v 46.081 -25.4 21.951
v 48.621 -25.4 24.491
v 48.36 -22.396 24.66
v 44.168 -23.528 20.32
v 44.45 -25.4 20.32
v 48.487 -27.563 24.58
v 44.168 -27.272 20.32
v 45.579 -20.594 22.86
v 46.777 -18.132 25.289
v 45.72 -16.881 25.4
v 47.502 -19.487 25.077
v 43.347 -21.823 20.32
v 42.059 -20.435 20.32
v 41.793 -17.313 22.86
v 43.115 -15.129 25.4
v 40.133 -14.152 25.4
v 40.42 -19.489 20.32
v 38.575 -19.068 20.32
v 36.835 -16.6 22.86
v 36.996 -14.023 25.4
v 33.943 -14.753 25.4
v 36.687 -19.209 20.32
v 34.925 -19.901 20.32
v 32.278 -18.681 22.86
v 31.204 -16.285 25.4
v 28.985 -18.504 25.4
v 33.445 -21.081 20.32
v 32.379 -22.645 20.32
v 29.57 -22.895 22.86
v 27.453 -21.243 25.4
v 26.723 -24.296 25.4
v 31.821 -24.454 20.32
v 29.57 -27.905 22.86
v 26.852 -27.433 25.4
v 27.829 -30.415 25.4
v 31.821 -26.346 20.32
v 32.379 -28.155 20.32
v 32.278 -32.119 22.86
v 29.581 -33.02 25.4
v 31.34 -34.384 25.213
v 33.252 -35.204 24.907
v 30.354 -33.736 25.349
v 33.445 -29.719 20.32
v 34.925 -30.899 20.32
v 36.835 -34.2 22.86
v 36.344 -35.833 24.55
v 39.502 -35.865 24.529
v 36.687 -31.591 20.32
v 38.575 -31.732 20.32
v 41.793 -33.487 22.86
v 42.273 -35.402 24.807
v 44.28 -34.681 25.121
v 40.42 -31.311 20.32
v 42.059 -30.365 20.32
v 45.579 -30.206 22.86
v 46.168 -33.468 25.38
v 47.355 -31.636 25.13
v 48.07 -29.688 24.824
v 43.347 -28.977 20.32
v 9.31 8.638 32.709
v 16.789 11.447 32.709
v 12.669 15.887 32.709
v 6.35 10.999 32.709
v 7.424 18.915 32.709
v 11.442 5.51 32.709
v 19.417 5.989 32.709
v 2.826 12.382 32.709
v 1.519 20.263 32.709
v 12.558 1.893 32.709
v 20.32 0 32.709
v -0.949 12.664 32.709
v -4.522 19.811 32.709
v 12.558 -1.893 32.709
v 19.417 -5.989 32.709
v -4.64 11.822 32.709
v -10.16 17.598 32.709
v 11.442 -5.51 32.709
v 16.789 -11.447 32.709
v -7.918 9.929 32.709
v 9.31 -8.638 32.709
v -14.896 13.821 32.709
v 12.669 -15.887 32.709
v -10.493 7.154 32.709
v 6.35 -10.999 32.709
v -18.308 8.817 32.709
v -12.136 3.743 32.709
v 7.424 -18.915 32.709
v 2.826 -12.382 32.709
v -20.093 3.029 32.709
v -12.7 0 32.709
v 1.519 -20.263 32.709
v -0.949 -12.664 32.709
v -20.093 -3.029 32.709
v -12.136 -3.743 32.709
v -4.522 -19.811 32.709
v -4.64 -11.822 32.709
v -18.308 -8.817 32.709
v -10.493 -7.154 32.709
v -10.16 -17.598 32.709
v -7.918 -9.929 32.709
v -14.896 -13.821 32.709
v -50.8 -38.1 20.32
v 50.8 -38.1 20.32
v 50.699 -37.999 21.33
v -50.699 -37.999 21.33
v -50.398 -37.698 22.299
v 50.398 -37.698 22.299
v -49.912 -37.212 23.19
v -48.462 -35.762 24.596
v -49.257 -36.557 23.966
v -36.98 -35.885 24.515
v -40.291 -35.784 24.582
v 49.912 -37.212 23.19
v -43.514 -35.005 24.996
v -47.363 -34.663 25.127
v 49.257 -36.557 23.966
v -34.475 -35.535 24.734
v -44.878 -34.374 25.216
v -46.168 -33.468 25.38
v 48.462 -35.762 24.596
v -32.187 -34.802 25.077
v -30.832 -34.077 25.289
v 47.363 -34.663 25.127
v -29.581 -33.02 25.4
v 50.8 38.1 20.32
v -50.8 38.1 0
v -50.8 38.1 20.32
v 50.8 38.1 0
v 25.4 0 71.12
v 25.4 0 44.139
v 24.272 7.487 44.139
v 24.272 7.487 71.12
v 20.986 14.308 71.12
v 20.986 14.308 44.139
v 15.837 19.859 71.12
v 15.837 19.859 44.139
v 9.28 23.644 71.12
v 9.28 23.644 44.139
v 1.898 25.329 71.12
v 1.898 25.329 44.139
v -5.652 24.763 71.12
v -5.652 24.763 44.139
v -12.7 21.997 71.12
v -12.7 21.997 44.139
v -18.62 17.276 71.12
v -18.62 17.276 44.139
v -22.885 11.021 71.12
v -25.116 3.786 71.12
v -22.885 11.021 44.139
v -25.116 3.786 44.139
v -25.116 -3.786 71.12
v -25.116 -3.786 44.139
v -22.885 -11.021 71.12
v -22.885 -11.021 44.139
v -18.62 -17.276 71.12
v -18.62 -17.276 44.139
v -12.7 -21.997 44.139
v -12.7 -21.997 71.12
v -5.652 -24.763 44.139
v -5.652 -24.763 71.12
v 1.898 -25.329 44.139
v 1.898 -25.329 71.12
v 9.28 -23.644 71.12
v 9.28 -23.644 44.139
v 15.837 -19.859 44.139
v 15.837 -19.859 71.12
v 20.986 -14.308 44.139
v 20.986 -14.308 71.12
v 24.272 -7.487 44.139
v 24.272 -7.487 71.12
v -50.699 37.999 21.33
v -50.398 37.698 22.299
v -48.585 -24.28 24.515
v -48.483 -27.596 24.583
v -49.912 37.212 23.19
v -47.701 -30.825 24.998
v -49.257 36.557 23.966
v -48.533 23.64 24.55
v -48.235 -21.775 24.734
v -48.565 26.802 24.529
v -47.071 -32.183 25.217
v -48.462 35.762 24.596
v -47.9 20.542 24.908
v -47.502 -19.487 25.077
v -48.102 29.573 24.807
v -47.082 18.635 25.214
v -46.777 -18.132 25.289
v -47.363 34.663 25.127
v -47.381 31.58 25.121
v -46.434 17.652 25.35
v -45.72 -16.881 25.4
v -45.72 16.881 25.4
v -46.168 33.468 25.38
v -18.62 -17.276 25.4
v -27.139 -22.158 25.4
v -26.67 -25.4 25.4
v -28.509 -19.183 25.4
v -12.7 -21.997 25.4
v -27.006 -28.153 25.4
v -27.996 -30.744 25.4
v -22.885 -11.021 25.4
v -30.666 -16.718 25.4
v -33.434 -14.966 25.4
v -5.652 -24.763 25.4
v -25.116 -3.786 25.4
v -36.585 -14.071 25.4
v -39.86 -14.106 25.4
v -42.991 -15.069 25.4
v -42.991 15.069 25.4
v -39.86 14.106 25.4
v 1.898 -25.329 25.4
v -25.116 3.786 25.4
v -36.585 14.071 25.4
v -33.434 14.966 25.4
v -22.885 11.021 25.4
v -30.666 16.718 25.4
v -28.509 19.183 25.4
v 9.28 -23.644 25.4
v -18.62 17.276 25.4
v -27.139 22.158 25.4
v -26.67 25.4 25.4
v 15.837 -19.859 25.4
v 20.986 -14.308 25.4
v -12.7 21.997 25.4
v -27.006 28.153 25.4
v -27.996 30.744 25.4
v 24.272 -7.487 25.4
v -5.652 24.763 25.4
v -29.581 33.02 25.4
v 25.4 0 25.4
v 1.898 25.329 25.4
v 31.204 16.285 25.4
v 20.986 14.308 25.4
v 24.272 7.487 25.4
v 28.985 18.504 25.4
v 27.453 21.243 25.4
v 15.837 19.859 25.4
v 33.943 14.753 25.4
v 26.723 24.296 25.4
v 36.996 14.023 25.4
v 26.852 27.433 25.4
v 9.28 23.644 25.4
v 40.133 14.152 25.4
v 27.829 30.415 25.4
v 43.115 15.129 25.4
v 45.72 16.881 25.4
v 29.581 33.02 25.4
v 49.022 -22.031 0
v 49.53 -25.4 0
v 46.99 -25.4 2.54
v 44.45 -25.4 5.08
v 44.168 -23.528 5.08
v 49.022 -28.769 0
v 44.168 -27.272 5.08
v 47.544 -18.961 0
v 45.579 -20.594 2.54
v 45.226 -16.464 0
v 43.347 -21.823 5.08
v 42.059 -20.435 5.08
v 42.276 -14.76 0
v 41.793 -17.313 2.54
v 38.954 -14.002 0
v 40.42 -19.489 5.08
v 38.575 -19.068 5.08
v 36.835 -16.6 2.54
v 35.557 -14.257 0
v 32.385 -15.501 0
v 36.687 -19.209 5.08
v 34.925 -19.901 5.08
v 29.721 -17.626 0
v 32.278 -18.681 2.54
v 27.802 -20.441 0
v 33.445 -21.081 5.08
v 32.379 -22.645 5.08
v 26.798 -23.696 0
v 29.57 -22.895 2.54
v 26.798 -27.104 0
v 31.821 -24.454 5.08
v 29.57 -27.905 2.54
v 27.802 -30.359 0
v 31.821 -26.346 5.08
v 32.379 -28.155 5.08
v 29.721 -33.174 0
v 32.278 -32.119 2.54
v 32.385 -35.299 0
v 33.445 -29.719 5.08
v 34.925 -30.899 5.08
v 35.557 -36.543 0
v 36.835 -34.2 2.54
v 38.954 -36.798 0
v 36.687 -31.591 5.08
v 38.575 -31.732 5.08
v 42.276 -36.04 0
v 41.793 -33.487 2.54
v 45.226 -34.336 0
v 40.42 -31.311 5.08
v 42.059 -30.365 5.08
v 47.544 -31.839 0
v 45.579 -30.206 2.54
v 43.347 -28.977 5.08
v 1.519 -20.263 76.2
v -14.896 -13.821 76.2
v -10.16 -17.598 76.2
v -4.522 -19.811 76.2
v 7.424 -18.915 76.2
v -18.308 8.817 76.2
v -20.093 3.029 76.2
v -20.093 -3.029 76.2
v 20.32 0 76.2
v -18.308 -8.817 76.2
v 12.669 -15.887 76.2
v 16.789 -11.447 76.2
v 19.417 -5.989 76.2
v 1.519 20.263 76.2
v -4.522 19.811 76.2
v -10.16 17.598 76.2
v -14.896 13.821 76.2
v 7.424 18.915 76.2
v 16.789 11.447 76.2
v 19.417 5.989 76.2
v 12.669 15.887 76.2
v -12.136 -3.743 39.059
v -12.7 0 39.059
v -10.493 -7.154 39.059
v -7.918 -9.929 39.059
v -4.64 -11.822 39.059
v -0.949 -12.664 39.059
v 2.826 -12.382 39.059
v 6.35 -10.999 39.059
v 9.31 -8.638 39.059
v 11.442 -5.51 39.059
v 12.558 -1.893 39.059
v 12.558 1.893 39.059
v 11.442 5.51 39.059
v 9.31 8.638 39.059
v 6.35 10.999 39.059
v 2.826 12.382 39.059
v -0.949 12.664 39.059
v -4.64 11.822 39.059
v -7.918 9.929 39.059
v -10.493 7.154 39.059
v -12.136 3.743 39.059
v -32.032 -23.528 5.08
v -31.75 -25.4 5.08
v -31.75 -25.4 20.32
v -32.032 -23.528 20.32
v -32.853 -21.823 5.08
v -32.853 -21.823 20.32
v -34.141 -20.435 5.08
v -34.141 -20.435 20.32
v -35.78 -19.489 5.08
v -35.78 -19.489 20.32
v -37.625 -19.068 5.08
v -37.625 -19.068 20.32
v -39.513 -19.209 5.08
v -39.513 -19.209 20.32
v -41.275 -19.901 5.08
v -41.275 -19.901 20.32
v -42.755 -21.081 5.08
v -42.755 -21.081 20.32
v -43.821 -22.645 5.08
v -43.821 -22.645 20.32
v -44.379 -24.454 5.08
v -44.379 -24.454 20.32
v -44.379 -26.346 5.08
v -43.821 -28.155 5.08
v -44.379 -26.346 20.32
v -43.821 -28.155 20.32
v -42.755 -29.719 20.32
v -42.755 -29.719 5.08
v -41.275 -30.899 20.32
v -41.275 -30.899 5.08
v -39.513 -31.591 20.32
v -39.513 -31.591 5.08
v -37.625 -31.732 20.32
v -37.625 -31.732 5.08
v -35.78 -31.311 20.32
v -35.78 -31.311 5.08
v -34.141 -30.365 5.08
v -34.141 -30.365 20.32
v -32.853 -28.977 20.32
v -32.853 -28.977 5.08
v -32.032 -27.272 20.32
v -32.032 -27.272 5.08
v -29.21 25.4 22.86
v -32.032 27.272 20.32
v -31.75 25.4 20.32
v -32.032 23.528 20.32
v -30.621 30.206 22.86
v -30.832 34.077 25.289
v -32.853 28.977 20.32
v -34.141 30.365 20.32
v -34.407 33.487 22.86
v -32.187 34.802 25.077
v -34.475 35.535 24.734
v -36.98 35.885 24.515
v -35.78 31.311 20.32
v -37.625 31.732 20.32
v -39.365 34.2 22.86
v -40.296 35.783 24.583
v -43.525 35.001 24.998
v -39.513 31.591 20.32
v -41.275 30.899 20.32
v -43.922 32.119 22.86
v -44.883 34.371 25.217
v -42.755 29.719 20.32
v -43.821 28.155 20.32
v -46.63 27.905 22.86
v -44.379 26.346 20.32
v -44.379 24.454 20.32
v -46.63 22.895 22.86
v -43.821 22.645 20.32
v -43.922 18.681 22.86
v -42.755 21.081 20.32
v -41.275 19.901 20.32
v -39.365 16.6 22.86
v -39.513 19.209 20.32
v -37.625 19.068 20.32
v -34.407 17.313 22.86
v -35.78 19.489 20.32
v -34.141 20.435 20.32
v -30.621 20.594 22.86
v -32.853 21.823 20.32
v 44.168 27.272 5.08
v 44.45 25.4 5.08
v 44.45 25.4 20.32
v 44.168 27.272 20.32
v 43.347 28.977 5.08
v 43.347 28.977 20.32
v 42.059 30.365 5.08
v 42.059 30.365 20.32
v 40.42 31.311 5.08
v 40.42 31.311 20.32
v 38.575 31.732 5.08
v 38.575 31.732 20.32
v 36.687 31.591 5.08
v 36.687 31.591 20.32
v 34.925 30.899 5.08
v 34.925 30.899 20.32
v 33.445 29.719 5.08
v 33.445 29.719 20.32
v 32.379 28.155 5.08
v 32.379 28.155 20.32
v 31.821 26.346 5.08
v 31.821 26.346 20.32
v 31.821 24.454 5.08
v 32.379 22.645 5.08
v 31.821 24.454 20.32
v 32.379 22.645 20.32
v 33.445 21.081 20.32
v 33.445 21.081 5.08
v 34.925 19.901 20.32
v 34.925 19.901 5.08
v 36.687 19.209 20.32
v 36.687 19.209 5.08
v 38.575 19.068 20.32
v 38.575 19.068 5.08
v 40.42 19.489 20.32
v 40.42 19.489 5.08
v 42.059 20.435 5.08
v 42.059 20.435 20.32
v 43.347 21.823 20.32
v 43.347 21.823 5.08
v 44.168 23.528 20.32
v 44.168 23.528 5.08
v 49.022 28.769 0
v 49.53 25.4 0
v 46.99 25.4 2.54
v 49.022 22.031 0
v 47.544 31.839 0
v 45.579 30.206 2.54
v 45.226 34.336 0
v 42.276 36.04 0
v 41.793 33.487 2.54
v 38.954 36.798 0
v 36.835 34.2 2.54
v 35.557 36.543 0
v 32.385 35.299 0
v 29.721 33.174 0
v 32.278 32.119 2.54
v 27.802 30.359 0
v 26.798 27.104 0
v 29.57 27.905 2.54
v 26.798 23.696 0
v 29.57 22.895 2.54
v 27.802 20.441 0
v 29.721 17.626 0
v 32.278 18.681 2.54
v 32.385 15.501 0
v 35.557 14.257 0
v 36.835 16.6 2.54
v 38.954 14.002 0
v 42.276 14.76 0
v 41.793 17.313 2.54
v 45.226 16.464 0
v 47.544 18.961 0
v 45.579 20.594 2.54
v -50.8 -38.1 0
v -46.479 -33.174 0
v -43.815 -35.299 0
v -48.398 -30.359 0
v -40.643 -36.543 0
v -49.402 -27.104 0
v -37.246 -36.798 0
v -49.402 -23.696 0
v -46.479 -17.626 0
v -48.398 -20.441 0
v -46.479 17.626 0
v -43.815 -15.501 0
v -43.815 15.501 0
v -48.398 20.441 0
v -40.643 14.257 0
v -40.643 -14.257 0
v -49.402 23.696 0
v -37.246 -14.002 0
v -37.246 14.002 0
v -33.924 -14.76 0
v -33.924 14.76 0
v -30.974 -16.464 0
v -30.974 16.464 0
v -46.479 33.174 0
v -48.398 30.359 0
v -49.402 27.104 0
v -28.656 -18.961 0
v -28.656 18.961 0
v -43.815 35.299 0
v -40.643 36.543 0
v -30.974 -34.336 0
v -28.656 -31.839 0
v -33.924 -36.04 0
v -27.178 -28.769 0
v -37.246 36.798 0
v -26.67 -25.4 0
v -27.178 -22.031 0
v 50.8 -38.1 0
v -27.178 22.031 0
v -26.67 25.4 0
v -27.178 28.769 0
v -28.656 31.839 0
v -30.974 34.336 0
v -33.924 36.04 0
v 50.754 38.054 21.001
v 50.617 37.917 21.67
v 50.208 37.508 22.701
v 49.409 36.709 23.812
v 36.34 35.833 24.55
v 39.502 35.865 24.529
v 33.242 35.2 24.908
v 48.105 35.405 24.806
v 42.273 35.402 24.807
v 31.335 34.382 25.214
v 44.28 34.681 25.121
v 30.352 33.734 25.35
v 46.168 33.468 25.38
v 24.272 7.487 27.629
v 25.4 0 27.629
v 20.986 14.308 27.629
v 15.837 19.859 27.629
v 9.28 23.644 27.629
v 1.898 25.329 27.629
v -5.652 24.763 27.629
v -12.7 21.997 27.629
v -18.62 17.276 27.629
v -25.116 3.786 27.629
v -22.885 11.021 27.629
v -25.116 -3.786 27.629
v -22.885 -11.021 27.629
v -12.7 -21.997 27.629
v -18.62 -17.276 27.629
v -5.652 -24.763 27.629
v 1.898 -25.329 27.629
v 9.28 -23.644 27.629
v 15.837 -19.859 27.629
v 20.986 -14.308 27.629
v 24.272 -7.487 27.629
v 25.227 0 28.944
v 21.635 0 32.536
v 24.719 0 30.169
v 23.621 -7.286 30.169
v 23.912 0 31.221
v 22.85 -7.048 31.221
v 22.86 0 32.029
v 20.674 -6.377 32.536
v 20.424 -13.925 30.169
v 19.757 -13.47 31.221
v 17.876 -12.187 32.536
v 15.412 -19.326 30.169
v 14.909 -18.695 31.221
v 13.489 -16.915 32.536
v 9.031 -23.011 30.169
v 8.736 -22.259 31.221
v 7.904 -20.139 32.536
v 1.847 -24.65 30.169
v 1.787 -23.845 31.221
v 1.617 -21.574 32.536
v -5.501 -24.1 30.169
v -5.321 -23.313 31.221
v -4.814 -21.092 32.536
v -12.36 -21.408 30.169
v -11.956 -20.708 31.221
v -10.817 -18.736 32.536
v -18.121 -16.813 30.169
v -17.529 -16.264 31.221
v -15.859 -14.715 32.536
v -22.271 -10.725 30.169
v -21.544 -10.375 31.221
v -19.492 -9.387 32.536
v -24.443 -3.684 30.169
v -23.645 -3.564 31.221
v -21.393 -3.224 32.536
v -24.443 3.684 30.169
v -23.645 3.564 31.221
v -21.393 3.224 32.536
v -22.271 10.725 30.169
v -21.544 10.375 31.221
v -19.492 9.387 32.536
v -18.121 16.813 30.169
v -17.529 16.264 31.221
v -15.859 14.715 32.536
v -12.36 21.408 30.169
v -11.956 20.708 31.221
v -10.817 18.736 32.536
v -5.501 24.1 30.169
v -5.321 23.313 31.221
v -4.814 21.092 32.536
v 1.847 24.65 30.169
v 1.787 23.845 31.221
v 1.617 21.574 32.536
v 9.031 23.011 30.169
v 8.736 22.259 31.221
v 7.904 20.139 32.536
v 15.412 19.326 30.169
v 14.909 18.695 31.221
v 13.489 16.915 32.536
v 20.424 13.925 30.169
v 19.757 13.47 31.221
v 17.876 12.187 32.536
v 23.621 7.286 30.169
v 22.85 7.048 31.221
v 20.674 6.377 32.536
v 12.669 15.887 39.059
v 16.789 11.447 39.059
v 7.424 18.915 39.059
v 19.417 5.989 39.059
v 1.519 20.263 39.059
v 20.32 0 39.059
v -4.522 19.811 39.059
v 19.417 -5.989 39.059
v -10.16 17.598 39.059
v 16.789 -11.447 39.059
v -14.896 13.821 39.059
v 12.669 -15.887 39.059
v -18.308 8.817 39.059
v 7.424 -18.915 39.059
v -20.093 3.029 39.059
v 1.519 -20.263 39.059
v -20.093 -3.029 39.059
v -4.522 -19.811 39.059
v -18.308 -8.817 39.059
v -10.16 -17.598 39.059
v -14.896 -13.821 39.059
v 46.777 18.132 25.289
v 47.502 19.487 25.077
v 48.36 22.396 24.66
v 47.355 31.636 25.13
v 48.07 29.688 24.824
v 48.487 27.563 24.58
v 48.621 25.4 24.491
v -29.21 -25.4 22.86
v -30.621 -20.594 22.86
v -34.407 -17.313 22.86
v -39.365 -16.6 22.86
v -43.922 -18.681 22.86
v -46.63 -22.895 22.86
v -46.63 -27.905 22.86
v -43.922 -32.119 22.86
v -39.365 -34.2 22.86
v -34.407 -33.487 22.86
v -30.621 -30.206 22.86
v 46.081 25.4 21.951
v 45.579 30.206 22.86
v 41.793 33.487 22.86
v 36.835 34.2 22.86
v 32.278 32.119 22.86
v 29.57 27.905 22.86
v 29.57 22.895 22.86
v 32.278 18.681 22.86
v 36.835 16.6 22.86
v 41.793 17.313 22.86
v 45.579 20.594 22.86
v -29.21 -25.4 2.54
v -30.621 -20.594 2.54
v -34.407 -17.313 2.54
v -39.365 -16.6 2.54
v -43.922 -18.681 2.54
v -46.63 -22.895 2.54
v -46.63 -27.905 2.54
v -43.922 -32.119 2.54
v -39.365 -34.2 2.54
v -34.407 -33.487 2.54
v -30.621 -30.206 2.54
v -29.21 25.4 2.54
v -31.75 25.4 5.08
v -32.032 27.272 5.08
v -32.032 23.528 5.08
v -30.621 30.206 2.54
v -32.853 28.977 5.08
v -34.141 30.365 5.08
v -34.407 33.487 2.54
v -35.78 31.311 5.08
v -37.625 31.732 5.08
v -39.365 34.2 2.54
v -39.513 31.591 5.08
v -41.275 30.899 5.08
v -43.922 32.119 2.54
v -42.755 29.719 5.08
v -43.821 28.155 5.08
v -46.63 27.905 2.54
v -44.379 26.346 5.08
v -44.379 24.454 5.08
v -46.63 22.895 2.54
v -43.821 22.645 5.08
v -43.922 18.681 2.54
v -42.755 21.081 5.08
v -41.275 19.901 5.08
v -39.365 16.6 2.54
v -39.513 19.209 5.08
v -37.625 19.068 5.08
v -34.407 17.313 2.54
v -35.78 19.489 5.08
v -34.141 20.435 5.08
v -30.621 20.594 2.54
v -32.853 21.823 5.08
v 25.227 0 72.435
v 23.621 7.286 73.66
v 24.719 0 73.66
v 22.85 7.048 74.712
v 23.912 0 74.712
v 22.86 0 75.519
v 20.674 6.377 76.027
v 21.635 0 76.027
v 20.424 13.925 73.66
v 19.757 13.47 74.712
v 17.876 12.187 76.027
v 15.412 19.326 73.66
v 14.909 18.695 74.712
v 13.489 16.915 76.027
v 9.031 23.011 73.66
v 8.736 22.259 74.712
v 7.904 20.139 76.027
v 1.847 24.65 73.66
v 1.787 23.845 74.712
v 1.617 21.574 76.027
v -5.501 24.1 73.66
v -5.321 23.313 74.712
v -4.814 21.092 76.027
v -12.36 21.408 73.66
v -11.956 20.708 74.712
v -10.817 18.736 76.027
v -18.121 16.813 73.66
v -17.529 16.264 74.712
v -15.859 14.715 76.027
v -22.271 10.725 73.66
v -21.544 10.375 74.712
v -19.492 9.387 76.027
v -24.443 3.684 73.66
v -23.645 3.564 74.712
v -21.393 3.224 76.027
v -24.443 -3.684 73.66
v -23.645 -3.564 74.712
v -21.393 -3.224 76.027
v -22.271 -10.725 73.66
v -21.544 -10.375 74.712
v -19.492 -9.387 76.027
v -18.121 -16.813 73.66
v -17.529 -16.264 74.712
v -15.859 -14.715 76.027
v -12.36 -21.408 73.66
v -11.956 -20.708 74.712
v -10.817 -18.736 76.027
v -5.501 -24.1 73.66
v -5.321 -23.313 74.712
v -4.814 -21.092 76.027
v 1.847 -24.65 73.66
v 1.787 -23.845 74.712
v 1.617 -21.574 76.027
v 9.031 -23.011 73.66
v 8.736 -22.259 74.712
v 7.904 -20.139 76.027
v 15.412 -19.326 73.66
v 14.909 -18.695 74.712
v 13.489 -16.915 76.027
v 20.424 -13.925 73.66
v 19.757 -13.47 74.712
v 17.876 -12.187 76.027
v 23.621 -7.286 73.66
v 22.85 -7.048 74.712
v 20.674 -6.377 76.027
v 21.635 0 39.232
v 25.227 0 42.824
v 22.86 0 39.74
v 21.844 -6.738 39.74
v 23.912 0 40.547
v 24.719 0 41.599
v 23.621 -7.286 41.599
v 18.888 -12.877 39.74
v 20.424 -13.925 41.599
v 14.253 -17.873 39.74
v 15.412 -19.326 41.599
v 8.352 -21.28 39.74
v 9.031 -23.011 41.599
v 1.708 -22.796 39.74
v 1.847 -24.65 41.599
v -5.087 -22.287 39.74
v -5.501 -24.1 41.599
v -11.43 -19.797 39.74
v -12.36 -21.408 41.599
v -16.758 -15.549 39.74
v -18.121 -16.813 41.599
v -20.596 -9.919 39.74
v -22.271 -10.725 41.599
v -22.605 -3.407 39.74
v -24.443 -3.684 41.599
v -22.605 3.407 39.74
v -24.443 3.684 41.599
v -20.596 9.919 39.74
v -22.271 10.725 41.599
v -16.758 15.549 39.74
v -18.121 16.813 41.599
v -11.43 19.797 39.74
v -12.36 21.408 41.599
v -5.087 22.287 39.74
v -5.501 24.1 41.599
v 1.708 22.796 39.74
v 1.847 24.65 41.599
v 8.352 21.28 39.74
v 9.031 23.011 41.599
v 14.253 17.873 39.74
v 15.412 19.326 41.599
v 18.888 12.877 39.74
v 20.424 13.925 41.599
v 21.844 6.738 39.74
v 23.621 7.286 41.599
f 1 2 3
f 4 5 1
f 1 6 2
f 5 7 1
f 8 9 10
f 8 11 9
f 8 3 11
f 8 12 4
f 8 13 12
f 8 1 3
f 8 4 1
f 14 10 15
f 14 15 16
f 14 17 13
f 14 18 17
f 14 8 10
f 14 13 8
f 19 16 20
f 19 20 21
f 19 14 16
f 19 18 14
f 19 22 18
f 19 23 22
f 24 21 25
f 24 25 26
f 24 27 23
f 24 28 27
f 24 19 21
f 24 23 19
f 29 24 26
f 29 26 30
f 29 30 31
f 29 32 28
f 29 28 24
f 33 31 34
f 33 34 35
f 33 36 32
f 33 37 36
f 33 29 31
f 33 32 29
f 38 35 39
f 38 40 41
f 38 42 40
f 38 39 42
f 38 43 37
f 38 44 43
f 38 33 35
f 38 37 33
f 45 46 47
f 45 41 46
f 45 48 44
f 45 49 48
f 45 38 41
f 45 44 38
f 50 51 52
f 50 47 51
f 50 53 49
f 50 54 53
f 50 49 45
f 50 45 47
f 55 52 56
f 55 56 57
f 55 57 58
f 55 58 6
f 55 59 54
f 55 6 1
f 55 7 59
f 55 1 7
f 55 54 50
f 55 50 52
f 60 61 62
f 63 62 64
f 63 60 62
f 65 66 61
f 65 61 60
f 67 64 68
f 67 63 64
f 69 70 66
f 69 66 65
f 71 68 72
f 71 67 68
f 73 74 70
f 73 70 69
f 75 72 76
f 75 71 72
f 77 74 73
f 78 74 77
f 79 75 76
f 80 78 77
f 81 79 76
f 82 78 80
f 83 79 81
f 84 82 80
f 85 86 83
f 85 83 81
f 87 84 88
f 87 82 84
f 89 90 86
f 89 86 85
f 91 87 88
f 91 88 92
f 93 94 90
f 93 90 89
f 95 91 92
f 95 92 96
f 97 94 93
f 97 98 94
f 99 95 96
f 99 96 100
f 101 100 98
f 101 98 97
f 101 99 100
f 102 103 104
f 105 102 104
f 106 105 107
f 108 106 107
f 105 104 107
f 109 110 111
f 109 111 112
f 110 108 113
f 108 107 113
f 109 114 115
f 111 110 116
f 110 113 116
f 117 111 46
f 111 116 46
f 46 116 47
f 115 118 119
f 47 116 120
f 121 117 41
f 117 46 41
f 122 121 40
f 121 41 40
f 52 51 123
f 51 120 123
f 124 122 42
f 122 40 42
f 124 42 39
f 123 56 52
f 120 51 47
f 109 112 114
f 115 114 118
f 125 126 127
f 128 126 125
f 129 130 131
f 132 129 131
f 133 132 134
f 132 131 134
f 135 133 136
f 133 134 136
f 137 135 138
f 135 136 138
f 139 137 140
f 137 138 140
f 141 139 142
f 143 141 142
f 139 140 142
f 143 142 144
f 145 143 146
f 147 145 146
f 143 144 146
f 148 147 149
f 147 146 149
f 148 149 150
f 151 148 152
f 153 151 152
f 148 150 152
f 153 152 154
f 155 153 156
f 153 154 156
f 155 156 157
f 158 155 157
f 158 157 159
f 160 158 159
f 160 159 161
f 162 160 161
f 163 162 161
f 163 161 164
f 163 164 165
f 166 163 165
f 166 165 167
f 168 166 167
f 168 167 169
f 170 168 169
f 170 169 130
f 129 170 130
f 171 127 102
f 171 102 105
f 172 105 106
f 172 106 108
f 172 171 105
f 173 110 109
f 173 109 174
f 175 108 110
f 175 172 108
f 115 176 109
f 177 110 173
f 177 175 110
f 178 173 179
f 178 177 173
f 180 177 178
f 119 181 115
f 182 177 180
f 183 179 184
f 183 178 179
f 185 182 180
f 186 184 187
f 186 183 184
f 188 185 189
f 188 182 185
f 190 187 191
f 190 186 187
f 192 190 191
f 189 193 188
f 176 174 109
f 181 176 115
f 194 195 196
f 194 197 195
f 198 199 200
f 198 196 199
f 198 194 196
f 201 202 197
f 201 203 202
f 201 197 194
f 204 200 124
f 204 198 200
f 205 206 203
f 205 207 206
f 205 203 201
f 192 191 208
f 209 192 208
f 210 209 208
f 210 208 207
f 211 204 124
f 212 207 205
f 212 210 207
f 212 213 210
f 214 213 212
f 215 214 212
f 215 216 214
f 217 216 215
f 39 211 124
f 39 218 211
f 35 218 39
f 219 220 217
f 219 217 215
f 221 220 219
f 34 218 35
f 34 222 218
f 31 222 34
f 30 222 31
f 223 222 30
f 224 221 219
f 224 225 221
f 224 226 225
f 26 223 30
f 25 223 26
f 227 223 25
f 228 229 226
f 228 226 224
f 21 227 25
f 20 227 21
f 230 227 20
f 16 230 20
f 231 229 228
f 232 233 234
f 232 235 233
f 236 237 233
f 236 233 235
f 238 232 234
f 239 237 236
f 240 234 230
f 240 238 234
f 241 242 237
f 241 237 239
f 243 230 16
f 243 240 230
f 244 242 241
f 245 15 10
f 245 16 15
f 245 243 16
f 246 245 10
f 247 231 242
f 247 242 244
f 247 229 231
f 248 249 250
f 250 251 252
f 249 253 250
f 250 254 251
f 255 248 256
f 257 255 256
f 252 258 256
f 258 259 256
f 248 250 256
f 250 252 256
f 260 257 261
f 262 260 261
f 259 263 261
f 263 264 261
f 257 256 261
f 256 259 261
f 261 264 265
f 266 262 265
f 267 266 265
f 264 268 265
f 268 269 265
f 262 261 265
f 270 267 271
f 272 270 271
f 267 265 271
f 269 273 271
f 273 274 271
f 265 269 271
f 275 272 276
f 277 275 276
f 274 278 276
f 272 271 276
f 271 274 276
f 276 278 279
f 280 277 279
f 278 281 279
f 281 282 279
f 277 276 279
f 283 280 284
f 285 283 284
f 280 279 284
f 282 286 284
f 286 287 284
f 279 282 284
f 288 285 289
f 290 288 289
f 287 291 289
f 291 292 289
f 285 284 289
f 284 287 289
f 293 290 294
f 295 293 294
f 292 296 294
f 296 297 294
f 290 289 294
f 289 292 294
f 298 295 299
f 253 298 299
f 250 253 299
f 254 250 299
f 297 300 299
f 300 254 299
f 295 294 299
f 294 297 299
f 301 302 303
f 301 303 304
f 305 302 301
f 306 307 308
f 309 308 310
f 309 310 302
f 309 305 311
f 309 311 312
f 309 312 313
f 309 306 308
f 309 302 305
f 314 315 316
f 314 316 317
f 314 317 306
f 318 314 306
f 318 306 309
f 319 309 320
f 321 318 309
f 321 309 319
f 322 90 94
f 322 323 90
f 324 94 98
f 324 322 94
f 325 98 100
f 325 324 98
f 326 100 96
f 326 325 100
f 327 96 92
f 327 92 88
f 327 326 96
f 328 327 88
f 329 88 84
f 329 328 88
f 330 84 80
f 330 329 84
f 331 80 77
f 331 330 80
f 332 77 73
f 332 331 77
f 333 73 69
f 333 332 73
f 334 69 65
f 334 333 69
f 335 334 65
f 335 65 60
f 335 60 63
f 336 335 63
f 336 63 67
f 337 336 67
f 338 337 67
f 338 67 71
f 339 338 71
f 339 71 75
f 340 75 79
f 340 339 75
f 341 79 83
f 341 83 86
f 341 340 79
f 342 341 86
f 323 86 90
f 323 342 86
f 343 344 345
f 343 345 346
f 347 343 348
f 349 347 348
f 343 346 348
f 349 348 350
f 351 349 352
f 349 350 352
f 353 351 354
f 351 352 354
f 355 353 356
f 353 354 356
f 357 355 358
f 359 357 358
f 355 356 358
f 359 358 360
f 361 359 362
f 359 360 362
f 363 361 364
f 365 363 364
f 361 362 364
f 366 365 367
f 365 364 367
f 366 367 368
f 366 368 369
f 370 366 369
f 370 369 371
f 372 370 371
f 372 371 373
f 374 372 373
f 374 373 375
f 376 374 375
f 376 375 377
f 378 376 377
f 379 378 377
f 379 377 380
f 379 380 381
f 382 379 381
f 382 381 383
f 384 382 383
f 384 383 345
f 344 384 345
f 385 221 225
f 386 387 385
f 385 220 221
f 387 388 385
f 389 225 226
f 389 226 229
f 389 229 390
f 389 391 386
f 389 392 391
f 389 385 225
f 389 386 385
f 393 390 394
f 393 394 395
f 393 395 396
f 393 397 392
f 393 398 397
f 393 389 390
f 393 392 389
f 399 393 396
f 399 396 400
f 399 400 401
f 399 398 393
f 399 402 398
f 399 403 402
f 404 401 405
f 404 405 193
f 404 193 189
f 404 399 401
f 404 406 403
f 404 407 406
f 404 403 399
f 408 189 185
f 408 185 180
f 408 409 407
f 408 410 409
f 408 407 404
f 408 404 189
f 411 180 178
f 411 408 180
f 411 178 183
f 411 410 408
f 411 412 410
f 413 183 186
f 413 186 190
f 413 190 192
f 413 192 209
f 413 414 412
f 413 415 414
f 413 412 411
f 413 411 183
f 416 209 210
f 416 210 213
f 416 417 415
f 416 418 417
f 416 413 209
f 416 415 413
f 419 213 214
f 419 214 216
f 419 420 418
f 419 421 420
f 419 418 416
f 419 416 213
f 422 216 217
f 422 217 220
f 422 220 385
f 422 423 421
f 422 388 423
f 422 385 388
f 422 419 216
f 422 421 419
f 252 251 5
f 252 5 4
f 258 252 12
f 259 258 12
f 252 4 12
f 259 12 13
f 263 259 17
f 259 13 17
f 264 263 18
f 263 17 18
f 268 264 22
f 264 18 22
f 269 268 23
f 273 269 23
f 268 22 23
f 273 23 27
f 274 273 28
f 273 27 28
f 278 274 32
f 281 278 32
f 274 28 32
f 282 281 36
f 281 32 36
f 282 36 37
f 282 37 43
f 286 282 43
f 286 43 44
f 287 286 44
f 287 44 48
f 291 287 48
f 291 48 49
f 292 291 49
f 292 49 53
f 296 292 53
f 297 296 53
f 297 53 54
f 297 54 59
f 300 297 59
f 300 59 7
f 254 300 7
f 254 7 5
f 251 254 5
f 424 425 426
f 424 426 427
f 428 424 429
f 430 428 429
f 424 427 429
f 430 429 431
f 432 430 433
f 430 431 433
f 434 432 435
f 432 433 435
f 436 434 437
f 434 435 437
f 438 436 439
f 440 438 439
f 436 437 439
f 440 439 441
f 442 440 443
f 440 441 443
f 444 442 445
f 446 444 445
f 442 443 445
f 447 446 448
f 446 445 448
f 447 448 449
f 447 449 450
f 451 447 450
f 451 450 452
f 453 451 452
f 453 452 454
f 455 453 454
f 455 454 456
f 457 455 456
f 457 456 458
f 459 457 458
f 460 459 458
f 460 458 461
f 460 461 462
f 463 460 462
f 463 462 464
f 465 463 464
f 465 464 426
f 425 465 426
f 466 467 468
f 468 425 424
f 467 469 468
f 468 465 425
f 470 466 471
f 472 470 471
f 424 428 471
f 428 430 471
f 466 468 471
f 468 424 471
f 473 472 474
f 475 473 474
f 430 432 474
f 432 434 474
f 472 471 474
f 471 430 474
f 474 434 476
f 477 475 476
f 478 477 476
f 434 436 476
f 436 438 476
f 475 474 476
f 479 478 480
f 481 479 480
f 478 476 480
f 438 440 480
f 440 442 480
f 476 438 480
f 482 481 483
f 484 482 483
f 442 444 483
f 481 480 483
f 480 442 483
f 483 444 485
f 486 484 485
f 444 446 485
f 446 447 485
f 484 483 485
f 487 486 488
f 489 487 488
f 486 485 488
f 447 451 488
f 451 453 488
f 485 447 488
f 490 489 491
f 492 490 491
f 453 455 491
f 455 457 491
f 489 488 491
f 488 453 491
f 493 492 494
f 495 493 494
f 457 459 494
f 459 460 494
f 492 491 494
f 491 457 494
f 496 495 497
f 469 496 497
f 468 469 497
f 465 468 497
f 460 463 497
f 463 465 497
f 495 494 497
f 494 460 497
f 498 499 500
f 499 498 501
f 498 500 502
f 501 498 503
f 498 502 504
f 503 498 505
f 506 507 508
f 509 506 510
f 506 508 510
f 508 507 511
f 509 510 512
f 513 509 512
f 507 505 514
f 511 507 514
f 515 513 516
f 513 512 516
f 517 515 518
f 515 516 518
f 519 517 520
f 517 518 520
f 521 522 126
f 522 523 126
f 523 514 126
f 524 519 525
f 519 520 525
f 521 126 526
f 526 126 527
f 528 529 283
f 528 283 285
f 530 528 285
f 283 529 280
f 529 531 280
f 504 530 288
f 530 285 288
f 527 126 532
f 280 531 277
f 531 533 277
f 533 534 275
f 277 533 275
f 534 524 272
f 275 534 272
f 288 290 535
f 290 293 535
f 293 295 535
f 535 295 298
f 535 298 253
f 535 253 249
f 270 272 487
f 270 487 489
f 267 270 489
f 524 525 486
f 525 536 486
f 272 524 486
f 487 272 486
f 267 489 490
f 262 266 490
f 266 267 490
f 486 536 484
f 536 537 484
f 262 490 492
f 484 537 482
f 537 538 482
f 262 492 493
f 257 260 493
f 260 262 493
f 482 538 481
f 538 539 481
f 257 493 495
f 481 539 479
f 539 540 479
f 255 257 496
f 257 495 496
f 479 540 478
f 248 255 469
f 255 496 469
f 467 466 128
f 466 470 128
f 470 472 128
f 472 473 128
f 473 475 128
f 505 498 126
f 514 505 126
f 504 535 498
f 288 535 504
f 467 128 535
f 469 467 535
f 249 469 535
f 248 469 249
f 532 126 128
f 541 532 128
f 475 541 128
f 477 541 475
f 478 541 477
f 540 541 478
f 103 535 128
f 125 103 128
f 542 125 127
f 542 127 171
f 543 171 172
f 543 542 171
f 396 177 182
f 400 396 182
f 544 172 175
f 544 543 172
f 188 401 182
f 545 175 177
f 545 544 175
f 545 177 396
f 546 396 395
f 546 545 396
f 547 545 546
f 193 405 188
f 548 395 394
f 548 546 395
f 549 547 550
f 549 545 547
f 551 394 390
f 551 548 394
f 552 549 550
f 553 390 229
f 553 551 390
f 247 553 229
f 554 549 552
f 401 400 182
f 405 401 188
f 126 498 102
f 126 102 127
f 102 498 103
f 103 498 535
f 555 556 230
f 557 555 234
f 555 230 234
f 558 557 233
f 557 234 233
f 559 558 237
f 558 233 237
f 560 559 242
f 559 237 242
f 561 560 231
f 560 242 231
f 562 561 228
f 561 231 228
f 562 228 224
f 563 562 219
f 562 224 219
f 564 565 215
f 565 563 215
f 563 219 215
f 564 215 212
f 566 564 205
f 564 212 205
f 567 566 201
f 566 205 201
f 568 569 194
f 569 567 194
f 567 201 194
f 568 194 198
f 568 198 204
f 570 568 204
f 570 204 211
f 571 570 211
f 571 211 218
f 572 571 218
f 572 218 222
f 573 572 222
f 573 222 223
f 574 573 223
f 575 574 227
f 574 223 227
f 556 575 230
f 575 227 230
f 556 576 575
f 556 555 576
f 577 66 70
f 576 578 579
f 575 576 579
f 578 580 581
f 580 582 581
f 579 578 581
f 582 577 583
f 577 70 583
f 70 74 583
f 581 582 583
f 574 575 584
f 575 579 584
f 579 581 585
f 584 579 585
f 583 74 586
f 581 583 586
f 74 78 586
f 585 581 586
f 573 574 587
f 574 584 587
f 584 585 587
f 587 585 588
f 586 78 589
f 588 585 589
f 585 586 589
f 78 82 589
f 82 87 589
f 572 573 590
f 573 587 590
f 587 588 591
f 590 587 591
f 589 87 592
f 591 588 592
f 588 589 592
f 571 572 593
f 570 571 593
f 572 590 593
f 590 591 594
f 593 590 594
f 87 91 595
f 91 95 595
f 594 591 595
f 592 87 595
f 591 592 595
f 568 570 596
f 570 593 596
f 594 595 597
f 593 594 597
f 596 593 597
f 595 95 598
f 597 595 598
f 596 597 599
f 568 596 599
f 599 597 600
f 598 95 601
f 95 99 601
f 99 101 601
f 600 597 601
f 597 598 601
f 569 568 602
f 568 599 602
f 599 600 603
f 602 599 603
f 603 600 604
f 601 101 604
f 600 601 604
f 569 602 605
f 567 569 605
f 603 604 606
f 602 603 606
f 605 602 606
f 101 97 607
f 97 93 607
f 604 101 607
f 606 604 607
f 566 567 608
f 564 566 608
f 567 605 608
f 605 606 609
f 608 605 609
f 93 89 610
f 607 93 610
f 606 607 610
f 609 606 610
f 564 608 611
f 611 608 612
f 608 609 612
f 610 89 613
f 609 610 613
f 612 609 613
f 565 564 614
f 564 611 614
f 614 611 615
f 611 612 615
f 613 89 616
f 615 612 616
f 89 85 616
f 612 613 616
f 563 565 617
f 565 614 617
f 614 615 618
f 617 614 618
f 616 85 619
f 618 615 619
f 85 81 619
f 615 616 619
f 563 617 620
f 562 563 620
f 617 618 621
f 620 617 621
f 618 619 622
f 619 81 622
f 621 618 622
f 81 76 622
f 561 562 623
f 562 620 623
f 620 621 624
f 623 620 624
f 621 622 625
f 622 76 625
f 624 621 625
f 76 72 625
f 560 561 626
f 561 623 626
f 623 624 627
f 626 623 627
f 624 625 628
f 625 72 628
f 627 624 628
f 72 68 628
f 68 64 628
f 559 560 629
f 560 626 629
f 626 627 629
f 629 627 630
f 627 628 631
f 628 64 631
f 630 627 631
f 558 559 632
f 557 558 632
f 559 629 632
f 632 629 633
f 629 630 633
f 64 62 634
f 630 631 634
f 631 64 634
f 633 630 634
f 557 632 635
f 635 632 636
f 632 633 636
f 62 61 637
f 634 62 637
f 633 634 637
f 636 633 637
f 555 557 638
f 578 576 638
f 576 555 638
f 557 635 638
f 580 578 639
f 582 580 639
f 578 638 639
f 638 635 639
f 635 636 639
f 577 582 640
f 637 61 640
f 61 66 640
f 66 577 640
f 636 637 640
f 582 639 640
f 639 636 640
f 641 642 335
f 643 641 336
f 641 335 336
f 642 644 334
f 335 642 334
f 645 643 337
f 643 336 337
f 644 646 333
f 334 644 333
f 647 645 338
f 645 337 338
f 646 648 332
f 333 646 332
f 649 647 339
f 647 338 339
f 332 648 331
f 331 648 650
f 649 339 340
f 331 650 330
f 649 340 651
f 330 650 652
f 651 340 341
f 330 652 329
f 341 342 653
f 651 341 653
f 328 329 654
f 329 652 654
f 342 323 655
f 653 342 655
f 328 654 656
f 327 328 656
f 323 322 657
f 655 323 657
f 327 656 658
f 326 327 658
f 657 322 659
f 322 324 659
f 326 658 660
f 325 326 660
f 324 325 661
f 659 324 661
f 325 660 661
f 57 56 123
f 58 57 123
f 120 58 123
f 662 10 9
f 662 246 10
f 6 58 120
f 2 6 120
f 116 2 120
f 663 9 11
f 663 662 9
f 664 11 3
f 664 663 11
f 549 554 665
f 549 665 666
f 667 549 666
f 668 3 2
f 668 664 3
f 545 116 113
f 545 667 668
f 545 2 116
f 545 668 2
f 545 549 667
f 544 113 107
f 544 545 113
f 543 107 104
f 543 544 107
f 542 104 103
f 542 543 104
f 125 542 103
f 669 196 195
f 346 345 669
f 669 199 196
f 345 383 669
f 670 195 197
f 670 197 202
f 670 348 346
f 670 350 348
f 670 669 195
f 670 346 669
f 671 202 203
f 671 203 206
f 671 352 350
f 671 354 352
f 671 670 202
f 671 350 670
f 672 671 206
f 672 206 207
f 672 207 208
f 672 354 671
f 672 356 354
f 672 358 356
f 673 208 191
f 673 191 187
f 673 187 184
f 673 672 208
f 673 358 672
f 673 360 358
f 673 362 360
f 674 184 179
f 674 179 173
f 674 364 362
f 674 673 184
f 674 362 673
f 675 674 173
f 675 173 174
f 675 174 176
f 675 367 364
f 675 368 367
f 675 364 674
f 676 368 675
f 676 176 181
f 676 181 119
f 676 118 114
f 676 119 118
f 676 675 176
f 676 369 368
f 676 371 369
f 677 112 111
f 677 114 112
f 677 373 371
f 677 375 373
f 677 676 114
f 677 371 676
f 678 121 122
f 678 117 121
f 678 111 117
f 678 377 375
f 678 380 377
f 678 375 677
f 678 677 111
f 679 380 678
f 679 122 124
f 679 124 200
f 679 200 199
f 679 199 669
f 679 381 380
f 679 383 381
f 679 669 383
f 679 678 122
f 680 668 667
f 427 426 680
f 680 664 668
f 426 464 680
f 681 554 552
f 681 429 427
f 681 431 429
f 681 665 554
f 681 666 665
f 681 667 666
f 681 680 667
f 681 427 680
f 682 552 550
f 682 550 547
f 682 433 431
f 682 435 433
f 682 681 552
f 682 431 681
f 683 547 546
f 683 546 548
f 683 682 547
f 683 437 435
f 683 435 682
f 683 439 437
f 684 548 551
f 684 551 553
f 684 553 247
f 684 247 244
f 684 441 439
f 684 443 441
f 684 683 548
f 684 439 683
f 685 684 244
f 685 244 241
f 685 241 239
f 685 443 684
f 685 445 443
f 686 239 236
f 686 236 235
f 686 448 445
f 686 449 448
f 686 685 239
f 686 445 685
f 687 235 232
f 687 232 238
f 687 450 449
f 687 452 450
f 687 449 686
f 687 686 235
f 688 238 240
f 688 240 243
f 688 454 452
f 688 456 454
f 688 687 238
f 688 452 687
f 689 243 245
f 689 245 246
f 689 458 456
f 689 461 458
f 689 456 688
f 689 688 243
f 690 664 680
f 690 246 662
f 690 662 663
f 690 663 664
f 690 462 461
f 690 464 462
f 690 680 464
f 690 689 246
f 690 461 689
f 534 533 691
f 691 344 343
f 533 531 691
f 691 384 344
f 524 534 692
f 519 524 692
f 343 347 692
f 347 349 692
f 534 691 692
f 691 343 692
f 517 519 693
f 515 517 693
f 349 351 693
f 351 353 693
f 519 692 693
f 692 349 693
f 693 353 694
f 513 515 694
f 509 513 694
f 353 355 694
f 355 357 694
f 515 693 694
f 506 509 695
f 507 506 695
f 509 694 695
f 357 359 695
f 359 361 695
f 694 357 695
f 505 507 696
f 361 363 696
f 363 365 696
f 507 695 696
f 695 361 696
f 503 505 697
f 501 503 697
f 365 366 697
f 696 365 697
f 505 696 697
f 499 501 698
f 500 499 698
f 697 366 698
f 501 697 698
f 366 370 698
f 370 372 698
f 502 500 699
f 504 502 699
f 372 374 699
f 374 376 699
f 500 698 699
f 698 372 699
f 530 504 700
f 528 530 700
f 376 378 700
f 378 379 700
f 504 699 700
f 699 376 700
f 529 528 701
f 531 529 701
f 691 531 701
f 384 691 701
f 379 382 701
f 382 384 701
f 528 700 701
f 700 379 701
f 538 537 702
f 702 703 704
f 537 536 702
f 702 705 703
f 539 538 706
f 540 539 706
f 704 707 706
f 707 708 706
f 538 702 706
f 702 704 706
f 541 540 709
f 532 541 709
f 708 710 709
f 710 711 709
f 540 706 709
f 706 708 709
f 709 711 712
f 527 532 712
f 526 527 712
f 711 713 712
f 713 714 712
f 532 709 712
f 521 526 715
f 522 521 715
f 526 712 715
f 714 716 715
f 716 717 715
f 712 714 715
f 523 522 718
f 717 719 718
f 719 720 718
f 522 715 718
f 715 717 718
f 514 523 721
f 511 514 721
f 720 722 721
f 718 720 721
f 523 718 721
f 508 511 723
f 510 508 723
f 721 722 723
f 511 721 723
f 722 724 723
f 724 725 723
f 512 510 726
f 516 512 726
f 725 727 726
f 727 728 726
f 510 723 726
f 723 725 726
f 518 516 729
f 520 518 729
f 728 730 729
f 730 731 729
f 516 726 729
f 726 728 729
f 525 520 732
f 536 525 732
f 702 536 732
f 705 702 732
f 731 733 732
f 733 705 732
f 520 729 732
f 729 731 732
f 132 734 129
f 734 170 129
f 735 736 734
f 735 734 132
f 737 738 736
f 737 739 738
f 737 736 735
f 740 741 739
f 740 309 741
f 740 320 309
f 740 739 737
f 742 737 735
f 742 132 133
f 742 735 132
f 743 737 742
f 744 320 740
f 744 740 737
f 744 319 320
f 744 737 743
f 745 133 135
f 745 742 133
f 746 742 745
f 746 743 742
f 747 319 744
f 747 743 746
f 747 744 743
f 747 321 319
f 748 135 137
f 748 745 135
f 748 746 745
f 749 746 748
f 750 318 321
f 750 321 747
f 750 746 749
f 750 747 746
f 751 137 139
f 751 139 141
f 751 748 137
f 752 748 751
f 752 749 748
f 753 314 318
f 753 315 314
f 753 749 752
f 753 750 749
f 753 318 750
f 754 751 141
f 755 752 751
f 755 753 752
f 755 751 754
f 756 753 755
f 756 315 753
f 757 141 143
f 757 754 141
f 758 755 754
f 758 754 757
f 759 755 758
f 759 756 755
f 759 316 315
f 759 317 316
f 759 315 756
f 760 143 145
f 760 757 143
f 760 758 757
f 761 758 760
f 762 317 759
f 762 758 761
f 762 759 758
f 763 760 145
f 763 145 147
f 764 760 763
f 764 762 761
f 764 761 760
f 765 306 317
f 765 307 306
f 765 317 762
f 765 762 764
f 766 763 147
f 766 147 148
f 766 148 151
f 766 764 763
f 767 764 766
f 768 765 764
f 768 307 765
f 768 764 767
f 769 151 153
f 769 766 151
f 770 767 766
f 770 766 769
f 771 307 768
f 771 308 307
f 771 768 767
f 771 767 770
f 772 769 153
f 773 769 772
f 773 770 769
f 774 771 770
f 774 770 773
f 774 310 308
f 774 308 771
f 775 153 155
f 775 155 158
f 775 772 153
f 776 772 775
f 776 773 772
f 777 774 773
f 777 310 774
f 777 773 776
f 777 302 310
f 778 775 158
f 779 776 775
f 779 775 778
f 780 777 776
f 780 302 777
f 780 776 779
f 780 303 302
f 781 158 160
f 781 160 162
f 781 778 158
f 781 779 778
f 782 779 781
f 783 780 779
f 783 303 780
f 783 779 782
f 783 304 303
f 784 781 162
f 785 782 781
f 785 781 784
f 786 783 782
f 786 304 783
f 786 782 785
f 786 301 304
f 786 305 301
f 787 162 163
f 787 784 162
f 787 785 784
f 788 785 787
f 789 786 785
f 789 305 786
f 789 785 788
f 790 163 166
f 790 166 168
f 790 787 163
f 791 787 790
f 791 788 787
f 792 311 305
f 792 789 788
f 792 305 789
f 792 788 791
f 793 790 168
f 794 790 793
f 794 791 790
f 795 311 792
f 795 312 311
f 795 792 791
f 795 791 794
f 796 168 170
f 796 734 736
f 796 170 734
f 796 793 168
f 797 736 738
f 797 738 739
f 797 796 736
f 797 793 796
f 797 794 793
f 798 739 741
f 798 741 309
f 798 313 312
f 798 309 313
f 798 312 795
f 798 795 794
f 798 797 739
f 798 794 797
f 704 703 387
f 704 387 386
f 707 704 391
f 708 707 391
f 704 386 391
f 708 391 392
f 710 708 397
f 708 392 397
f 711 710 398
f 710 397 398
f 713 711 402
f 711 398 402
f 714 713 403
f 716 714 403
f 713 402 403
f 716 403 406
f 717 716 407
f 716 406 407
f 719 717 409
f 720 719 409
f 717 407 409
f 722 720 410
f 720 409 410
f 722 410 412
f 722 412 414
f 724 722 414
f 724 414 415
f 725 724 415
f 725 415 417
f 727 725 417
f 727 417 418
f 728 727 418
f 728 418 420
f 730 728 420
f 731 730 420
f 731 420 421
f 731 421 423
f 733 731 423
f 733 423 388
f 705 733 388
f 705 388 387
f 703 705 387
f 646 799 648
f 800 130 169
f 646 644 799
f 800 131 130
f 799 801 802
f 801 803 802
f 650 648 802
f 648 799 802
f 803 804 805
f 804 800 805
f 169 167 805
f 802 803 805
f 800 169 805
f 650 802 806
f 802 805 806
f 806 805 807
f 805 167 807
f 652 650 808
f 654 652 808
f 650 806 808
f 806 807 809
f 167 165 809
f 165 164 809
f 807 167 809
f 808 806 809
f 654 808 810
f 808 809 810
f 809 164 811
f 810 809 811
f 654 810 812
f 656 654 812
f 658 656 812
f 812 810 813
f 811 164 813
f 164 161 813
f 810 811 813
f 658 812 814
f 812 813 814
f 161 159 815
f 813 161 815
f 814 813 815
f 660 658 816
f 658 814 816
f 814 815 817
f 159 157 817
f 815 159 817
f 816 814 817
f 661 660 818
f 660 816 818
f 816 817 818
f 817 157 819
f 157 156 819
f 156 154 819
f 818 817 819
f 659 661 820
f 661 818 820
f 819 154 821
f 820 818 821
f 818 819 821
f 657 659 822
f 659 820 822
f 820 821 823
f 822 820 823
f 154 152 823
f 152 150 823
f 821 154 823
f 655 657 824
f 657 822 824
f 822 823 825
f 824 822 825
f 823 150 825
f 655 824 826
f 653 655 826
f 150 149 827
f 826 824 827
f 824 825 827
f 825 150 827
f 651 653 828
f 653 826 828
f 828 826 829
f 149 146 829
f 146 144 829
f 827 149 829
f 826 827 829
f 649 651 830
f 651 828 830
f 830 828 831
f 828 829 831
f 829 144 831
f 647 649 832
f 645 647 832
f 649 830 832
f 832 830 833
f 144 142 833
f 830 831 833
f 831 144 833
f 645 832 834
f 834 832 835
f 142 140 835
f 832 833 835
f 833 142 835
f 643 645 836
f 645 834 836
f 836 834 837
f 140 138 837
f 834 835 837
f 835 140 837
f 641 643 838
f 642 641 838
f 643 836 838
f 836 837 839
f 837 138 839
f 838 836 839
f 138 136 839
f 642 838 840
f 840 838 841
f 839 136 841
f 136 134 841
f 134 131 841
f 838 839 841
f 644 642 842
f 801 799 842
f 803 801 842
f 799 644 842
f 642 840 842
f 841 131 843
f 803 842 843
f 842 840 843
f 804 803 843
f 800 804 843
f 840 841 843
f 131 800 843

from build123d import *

# Parameters (mm, degrees)
F0_W     = 101.6
F0_H     = 76.2
F1_DEPTH = 25.4
F2_R     = 6.35
F3_DEPTH = 25.4
F4_R     = 25.4
F5_DEPTH = 50.8
F6_W     = 61.2722363651
F6_H     = 6.35
F8_R     = 5.08


# Not quite as in the source:
# - a fillet or chamfer that OpenCascade refuses, or shapes differently, is made with other operations: its cross-section is extruded or revolved along the edge and cut away or added


with BuildPart() as f1:
    # F0 (on Top) → F1 (new body)
    with BuildSketch(Plane.XY):
        Rectangle(F0_W, F0_H)
    extrude(amount=F1_DEPTH)

    # F2 (on face) → F3 (cut, through all)
    with BuildSketch(Plane.XY.offset(25.4)):
        with Locations((-38.1, 25.4)):
            Circle(F2_R)
        with Locations((38.1, 25.4)):
            Circle(F2_R)
        with Locations((38.1, -25.4)):
            Circle(F2_R)
        with Locations((-38.1, -25.4)):
            Circle(F2_R)
    extrude(amount=-F3_DEPTH, mode=Mode.SUBTRACT)

    # F4 (on face) → F5 (join)
    with BuildSketch(Plane.XY.offset(25.4)):
        Circle(F4_R)
    extrude(amount=F5_DEPTH)

    # F6 (on Front) → F7 (revolve, cut)
    with BuildSketch(Plane.XZ):
        with Locations((-43.3361181825, 35.8842967927)):
            Rectangle(F6_W, F6_H)
    revolve(axis=Axis((0, 0, 28.4035503864), (0, 0, 1)), mode=Mode.SUBTRACT)

    # F8
    f8_edges = [f1.edges().sort_by_distance(p)[0] for p in [
        (0, -38.1, 25.4),
        (-25.4, 0, 32.709297),
        (-25.4, 0, 39.059297),
        (-25.4, 0, 76.2),
        (50.8, 0, 25.4),
        (0, 38.1, 25.4),
        (-50.8, 0, 25.4),
    ]]
    fillet(f8_edges, radius=F8_R)

    # F9: chamfer of 5.08 on 12 edges, made by hand

    # F9_s1 → F9_t2 (revolve, cut)
    with BuildSketch(Plane.XZ.offset(25.4)):
        Polygon((-26.67, 25.4), (-31.75, 20.32), (-31.75, 25.4), align=None)
    revolve(axis=Axis((-38.1, -25.4, 25.4), (0, 0, 1)), mode=Mode.SUBTRACT)

    # F9_s3 → F9_t4 (revolve, cut)
    with BuildSketch(Plane.XZ.offset(25.4)):
        Polygon((-26.67, 0), (-31.75, 5.08), (-31.75, 0), align=None)
    revolve(axis=Axis((-38.1, -25.4, 0), (0, 0, 1)), mode=Mode.SUBTRACT)

    # F9_s5 → F9_t6 (revolve, cut)
    with BuildSketch(Plane.XZ.offset(-25.4)):
        Polygon((-26.67, 25.4), (-31.75, 20.32), (-31.75, 25.4), align=None)
    revolve(axis=Axis((-38.1, 25.4, 25.4), (0, 0, 1)), mode=Mode.SUBTRACT)

    # F9_s7 → F9_t8 (revolve, cut)
    with BuildSketch(Plane.XZ.offset(-25.4)):
        Polygon((-26.67, 0), (-31.75, 5.08), (-31.75, 0), align=None)
    revolve(axis=Axis((-38.1, 25.4, 0), (0, 0, 1)), mode=Mode.SUBTRACT)

    # F9_s9 → F9_t10 (revolve, cut)
    with BuildSketch(Plane.XZ.offset(-25.4)):
        Polygon((49.53, 25.4), (44.45, 20.32), (44.45, 25.4), align=None)
    revolve(axis=Axis((38.1, 25.4, 25.4), (0, 0, 1)), mode=Mode.SUBTRACT)

    # F9_s11 → F9_t12 (revolve, cut)
    with BuildSketch(Plane.XZ.offset(-25.4)):
        Polygon((49.53, 0), (44.45, 5.08), (44.45, 0), align=None)
    revolve(axis=Axis((38.1, 25.4, 0), (0, 0, 1)), mode=Mode.SUBTRACT)

    # F9_s13 → F9_t14 (revolve, cut)
    with BuildSketch(Plane.XZ.offset(25.4)):
        Polygon((49.53, 25.4), (44.45, 20.32), (44.45, 25.4), align=None)
    revolve(axis=Axis((38.1, -25.4, 25.4), (0, 0, 1)), mode=Mode.SUBTRACT)

    # F9_s15 → F9_t16 (revolve, cut)
    with BuildSketch(Plane.XZ.offset(25.4)):
        Polygon((49.53, 0), (44.45, 5.08), (44.45, 0), align=None)
    revolve(axis=Axis((38.1, -25.4, 0), (0, 0, 1)), mode=Mode.SUBTRACT)


solid = f1.part
